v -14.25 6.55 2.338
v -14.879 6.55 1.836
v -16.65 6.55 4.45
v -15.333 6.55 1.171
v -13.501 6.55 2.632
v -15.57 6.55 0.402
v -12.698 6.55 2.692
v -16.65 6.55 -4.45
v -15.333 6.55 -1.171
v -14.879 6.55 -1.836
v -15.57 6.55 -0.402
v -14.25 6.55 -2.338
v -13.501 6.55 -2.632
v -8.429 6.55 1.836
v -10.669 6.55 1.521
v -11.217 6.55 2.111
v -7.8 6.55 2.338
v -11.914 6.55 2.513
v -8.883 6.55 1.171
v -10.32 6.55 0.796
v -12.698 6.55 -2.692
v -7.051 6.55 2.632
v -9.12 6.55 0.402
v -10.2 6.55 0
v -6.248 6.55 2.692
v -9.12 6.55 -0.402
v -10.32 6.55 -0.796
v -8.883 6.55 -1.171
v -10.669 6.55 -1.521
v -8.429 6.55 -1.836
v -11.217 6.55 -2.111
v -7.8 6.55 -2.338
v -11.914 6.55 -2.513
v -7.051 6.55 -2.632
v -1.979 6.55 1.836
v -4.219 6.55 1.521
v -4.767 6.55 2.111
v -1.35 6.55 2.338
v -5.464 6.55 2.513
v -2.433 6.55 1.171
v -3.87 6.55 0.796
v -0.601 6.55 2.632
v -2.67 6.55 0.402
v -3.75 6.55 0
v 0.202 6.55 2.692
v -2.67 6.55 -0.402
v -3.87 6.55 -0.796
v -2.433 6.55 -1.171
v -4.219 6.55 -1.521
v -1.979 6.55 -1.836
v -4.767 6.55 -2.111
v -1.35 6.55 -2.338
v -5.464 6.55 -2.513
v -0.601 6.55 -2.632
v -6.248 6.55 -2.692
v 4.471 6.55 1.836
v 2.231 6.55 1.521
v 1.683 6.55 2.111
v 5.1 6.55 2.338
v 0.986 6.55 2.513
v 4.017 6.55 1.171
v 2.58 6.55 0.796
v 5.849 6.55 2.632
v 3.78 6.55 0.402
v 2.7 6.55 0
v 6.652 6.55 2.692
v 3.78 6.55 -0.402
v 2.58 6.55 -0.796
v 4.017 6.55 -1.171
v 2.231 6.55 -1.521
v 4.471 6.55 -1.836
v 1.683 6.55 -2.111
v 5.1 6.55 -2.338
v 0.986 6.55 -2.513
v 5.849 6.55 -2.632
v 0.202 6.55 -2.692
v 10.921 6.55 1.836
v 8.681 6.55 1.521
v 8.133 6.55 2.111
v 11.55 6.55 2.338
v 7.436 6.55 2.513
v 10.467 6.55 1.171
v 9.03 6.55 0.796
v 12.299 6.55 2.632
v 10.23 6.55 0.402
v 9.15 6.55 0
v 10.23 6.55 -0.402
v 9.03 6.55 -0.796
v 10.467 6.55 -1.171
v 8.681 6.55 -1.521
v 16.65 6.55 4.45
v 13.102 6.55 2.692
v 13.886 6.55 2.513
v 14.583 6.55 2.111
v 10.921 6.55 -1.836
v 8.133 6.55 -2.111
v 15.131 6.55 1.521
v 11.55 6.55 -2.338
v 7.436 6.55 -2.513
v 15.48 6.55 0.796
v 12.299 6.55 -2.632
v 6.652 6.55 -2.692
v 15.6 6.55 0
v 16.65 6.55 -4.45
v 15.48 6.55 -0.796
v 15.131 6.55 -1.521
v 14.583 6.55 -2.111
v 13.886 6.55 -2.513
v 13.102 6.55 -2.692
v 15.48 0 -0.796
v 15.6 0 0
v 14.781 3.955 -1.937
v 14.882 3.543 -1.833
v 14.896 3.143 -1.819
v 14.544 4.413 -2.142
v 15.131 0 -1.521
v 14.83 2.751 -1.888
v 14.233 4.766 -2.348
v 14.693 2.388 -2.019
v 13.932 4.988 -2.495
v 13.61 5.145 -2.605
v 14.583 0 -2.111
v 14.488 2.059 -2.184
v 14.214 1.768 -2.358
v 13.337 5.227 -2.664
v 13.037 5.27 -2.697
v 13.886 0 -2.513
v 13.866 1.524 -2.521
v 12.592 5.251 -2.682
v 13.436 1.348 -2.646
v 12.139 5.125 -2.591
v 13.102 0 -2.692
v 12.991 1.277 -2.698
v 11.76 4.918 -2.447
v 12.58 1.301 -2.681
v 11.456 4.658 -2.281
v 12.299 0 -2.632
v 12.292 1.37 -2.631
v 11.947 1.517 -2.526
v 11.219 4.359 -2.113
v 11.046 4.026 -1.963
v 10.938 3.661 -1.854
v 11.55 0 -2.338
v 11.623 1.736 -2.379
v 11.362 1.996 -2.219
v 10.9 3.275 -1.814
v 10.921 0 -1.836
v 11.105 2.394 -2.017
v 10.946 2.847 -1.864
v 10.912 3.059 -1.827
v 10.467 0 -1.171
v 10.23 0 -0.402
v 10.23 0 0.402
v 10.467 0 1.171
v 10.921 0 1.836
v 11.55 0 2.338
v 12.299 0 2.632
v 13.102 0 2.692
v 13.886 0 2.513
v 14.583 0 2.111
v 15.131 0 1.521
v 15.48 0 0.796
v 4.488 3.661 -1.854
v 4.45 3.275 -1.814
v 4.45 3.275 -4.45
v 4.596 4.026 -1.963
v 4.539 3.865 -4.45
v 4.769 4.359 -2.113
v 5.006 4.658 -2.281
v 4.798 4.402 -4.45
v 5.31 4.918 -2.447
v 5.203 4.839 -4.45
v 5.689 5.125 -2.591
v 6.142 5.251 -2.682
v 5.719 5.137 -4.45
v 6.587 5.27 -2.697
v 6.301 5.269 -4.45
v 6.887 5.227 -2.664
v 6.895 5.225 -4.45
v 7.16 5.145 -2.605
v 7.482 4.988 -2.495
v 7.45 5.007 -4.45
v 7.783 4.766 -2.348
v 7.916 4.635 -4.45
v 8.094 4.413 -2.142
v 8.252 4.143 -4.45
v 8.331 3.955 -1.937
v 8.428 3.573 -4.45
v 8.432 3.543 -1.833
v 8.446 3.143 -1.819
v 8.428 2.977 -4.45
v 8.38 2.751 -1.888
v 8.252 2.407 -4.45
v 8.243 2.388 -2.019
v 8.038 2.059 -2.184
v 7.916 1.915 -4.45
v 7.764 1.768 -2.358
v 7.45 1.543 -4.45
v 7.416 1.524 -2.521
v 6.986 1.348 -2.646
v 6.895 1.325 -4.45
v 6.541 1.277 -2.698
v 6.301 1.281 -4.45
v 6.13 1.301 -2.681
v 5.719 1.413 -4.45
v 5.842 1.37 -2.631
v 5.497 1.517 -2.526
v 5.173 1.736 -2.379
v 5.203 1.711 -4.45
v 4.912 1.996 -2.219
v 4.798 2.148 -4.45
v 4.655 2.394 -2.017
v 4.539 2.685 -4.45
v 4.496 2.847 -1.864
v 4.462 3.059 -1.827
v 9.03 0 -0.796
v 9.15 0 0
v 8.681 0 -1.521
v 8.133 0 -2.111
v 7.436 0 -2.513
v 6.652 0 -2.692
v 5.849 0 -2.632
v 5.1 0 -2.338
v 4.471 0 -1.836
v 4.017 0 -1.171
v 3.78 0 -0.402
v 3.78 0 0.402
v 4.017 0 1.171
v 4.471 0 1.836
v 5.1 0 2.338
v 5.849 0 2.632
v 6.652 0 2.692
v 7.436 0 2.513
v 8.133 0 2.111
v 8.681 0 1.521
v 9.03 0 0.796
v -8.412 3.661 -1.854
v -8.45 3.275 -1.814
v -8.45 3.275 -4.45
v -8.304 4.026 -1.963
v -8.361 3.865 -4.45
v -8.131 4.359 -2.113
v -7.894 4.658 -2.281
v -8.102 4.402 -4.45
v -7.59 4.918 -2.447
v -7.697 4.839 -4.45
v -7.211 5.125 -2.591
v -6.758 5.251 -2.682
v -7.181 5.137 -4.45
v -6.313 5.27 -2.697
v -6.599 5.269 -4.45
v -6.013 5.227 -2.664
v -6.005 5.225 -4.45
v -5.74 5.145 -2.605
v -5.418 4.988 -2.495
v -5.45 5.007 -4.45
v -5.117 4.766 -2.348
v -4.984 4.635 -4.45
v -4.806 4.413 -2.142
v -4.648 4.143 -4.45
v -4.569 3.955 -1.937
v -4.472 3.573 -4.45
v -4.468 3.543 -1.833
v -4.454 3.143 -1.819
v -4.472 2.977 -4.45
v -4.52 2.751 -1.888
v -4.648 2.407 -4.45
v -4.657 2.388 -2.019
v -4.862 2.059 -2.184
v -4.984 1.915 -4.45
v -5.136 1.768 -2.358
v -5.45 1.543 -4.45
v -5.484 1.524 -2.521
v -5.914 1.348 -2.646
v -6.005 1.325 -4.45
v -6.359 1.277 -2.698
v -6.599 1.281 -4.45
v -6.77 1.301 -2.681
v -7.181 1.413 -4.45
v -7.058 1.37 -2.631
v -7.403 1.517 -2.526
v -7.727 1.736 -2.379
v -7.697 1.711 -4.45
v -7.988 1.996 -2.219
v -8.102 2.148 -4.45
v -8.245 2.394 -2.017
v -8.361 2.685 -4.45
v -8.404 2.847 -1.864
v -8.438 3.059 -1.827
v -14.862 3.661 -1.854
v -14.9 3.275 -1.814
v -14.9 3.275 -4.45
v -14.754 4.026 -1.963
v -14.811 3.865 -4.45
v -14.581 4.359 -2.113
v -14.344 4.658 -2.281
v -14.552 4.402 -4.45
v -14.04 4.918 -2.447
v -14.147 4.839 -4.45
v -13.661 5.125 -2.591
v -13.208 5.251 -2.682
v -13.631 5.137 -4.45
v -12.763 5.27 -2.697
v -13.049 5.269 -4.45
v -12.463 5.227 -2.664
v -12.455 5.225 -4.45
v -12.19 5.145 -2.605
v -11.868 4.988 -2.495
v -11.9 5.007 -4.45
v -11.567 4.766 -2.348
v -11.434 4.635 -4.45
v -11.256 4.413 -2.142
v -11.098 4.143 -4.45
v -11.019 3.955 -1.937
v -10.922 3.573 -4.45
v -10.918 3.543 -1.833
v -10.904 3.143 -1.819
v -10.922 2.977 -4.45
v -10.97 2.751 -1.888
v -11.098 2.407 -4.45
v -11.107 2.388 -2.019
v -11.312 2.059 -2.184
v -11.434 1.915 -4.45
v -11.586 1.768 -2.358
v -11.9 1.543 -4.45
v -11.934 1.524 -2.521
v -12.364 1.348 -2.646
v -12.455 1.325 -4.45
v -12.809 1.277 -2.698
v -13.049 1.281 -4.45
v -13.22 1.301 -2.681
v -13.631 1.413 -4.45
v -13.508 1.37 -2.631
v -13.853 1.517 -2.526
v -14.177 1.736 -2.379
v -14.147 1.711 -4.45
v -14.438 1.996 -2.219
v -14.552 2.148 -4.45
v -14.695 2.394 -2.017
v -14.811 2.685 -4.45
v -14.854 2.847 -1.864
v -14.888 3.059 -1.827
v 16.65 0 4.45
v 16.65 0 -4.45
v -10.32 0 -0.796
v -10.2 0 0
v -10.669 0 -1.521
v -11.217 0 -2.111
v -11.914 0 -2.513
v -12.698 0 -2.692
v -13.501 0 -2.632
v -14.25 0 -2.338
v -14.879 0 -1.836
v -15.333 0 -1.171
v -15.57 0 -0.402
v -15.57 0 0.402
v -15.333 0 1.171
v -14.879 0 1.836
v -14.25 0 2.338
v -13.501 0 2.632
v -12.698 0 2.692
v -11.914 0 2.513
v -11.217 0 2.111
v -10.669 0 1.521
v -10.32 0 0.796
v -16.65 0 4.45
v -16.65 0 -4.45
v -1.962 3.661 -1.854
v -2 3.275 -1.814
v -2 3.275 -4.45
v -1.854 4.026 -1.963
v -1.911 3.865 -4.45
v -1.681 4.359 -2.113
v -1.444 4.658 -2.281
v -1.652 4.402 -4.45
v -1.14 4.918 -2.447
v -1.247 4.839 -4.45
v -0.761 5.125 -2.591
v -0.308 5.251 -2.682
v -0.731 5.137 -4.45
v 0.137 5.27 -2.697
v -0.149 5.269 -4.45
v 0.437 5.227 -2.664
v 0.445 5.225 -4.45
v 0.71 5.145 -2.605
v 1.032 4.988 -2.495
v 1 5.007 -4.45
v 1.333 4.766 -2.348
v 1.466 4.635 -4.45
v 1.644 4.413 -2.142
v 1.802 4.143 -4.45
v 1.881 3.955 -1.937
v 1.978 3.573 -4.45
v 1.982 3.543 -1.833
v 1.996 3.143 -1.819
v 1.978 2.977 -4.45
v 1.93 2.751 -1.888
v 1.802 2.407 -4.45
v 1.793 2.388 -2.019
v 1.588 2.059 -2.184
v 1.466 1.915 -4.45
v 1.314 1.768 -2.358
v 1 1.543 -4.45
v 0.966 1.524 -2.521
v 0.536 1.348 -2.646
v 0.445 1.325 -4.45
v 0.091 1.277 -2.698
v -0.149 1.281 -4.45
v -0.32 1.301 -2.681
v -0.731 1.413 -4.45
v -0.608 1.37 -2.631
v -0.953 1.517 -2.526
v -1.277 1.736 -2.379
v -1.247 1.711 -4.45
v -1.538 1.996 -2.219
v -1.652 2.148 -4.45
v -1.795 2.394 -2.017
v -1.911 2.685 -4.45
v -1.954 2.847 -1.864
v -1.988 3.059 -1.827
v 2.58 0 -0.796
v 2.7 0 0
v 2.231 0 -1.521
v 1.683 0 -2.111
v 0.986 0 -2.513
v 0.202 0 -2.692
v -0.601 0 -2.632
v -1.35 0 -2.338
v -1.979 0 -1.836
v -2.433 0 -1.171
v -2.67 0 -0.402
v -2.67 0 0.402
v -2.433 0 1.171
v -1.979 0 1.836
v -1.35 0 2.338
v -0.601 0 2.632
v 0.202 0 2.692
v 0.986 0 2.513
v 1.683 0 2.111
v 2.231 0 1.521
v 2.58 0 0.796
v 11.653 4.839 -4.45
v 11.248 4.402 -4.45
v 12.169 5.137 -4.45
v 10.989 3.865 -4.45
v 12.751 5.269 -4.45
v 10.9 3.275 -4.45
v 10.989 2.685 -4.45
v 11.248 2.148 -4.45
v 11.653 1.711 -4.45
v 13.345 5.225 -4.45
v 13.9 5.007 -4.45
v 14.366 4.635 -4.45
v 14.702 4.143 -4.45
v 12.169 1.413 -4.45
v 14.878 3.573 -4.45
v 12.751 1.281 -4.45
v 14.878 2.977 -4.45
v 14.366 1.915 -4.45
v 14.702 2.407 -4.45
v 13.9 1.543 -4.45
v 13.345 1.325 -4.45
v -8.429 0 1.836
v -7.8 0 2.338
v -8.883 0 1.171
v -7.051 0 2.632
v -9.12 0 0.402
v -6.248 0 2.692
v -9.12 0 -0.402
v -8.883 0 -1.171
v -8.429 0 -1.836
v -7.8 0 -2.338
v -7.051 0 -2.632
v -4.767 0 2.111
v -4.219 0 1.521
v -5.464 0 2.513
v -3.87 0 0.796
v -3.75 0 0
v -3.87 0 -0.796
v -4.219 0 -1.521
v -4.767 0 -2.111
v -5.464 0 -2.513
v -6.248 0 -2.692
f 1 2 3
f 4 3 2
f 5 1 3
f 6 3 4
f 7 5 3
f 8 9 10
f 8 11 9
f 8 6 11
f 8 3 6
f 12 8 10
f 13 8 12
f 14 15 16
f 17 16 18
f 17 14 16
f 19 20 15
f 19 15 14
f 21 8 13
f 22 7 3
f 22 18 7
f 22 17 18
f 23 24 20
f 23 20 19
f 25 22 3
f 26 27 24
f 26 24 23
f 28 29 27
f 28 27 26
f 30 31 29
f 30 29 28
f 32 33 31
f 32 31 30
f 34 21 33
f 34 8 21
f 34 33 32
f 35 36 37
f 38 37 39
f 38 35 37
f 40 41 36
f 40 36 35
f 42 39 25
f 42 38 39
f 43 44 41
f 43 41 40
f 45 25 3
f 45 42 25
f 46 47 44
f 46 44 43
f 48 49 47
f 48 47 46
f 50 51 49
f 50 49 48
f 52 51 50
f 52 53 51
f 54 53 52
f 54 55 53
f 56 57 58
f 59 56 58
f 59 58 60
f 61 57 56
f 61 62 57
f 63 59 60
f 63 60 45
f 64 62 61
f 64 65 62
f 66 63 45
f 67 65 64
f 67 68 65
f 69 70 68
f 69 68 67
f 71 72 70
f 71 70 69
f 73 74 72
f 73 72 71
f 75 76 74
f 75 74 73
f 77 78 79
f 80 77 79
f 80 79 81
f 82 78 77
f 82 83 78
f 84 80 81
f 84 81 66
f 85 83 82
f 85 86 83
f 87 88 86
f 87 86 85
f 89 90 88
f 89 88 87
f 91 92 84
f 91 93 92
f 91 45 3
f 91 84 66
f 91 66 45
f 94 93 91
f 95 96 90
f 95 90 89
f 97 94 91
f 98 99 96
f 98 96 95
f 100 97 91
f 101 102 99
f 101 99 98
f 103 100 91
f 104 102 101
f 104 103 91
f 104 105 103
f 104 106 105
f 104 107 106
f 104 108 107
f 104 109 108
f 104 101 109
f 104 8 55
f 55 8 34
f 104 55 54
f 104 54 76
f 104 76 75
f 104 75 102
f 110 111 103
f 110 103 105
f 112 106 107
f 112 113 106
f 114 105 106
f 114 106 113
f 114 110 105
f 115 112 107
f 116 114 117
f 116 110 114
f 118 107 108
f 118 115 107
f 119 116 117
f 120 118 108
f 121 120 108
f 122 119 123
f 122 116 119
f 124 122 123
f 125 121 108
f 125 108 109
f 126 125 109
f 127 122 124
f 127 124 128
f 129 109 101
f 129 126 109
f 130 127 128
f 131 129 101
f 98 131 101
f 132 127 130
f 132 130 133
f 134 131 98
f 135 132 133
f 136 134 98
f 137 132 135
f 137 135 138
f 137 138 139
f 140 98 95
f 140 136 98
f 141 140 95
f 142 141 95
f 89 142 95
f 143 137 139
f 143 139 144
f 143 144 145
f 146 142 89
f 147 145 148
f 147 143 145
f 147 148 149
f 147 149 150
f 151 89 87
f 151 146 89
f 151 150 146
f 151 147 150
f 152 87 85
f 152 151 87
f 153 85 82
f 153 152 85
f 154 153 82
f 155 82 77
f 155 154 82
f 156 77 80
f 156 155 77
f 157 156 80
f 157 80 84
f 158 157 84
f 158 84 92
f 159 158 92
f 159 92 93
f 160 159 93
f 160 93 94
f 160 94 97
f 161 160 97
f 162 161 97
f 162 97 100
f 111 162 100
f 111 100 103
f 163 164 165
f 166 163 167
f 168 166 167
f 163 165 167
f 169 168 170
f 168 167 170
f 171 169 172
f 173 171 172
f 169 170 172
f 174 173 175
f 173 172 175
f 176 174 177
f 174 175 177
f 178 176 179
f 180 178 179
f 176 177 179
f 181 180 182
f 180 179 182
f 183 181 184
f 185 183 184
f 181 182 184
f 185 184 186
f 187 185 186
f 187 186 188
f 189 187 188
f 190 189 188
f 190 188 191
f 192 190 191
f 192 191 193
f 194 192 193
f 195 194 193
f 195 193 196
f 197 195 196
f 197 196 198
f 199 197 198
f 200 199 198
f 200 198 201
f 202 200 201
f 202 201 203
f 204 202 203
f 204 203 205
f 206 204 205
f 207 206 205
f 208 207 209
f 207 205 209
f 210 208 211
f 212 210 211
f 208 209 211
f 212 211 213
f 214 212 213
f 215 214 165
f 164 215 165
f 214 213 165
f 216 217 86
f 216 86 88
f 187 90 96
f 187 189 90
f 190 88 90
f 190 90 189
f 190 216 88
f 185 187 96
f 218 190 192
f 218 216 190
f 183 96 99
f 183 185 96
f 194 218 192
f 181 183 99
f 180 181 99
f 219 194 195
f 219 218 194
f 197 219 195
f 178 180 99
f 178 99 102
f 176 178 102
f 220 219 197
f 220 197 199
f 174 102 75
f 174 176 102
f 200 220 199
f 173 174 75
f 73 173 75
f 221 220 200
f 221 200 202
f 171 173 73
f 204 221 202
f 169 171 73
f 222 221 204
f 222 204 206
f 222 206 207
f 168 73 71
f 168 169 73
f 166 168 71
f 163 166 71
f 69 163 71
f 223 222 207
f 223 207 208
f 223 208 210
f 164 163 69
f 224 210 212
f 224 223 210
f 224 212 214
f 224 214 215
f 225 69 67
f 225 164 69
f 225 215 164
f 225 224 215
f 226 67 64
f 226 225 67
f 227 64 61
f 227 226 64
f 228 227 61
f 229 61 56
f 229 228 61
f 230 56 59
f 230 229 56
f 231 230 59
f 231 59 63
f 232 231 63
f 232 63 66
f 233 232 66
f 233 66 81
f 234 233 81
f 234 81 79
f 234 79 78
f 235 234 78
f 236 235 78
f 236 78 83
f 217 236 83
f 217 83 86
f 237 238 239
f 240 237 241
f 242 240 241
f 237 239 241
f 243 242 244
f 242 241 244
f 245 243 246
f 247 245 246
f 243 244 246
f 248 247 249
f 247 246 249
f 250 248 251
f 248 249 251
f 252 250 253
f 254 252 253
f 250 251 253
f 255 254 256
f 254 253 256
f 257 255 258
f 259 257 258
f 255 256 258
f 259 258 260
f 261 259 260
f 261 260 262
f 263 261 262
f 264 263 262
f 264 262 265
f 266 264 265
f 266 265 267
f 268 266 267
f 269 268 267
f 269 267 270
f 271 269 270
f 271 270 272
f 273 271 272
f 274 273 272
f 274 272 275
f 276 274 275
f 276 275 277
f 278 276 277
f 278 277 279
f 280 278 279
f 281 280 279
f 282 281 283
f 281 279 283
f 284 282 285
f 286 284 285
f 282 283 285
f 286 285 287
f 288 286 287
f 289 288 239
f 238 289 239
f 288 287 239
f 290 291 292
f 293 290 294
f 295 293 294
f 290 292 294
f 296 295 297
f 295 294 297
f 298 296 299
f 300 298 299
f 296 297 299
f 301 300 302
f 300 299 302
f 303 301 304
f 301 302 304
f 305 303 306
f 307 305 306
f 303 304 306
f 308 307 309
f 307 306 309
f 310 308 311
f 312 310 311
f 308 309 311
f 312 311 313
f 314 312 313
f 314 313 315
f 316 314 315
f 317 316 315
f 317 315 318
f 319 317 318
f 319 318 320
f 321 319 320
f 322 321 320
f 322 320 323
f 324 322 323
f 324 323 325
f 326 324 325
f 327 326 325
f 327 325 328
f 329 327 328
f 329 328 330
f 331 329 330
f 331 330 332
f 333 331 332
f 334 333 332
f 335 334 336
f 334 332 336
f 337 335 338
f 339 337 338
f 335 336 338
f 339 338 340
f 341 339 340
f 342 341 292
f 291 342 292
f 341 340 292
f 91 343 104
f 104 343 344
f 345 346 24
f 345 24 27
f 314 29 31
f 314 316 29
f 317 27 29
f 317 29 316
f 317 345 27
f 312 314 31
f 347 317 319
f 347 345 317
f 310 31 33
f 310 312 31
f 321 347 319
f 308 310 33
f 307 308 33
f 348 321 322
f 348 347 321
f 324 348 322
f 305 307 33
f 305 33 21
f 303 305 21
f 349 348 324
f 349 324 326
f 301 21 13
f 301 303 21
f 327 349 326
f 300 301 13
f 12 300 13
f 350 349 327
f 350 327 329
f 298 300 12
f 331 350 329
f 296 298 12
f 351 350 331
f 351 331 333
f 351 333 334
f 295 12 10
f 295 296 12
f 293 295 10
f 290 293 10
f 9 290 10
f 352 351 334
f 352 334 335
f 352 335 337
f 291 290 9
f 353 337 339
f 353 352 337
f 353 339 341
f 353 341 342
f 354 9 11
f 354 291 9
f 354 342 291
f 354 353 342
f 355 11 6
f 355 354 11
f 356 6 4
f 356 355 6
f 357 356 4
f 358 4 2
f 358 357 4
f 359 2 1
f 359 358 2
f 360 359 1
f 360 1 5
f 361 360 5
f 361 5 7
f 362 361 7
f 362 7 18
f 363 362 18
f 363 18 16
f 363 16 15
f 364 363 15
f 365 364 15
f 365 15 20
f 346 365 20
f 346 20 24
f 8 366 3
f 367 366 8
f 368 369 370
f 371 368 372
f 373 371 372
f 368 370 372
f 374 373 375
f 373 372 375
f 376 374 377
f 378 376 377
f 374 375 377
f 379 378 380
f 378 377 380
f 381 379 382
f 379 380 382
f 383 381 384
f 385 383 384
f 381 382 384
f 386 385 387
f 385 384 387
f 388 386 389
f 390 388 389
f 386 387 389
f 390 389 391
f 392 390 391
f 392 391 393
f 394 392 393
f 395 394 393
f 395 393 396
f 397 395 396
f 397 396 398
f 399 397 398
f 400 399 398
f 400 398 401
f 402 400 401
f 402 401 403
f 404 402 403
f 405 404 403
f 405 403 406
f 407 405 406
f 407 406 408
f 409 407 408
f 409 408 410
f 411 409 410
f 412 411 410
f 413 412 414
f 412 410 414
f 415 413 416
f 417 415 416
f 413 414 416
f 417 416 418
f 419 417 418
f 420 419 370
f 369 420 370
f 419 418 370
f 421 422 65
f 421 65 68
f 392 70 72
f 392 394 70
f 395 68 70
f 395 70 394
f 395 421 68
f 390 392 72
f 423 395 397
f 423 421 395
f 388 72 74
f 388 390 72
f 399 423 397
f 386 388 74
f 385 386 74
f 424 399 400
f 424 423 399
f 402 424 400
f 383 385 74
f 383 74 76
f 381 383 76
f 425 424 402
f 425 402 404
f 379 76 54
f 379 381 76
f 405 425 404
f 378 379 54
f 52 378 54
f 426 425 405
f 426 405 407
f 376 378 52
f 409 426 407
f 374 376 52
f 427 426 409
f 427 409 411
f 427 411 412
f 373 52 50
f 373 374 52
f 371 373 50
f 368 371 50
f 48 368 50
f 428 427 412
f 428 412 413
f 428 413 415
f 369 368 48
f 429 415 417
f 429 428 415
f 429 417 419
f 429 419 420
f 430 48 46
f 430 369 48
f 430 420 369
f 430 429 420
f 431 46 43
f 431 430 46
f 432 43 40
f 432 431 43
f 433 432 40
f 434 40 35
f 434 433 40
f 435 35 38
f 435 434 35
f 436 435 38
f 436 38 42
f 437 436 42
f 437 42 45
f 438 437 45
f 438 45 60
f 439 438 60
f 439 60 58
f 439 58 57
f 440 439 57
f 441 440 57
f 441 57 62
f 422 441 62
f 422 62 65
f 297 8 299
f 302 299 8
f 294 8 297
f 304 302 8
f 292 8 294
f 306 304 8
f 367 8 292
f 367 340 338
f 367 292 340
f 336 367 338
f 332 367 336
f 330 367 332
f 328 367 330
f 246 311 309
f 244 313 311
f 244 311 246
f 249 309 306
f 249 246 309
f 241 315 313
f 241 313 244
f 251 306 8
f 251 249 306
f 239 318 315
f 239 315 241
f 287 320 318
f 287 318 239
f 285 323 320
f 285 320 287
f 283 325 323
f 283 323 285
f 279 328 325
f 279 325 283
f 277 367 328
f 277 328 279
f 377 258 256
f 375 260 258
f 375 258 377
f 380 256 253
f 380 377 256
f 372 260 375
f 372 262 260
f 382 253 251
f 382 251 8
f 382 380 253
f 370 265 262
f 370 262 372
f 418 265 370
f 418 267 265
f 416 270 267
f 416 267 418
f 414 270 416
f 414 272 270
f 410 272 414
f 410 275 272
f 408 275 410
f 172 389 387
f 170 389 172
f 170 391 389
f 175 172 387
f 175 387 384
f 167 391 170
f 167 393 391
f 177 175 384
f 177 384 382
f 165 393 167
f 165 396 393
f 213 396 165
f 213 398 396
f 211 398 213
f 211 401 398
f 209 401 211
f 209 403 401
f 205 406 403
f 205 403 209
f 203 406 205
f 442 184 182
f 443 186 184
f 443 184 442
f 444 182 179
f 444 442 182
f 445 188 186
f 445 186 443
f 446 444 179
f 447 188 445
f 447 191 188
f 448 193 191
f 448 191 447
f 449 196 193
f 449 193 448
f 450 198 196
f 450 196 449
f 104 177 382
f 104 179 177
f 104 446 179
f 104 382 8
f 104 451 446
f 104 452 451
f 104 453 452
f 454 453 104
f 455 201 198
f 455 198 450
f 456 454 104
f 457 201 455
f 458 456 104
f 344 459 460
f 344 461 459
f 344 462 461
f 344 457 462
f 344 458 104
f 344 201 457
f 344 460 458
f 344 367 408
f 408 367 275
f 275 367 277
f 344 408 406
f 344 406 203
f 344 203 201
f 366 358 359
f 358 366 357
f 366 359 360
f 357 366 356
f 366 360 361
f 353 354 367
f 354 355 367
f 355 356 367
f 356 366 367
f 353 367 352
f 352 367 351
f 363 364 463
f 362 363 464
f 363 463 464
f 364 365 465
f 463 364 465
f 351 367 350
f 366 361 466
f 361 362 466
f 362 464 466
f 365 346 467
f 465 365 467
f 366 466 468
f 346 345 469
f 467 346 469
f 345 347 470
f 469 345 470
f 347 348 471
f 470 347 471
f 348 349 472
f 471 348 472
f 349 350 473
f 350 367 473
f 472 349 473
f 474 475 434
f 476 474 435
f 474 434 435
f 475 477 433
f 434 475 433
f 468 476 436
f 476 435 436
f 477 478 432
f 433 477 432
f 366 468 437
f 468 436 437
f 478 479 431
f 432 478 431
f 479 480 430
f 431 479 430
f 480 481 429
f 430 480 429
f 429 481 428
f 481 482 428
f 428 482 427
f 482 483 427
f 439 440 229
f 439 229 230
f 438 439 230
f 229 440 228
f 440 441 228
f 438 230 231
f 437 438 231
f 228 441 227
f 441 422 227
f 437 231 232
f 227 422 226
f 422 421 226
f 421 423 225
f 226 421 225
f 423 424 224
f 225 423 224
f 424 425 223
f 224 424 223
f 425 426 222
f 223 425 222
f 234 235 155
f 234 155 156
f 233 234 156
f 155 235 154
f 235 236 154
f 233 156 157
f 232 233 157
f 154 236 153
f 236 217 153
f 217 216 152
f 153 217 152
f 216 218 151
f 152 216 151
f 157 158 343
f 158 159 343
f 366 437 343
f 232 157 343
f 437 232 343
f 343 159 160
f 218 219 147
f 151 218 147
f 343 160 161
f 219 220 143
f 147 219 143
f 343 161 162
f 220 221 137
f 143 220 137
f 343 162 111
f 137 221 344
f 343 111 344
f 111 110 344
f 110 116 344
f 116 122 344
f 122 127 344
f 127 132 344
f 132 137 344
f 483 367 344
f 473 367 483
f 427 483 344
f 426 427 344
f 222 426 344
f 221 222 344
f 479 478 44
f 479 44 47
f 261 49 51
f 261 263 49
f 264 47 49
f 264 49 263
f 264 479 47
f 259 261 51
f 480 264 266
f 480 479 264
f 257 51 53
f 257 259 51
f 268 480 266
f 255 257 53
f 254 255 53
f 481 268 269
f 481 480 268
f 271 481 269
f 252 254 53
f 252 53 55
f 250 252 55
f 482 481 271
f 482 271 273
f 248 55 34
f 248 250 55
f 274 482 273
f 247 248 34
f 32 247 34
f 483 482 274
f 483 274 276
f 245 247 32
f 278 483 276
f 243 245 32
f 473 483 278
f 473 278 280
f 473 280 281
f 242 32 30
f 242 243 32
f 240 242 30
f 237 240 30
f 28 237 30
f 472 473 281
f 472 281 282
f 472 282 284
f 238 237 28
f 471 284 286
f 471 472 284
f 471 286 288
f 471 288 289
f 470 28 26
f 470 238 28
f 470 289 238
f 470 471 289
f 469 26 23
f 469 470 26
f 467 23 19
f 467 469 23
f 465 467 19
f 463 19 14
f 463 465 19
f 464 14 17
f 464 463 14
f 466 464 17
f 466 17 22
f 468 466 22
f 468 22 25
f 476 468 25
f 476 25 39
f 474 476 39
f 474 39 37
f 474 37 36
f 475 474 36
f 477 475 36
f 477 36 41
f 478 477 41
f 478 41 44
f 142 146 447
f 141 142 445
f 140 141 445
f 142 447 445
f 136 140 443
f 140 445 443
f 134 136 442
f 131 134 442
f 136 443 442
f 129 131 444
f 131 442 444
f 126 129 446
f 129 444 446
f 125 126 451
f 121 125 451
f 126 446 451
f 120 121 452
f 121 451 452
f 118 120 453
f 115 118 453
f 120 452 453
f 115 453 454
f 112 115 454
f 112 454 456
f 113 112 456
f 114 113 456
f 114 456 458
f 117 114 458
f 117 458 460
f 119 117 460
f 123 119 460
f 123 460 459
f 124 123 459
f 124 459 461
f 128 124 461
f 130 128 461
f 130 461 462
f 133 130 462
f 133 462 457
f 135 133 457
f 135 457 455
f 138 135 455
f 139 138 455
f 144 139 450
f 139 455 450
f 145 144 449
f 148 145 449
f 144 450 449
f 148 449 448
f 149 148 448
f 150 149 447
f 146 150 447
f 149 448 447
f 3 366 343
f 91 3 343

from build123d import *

# Parameters (mm, degrees)
SKETCH1_W           = 33.3
SKETCH1_H           = 8.9
SKETCH1_R           = 2.7
BOSS_EXTRUDE1_DEPTH = 6.55
CUT_EXTRUDE1_REACH  = 10.9
SKETCH2_R           = 2


with BuildPart() as part:
    # Sketch1 → Boss-Extrude1 (new body)
    with BuildSketch(Plane(origin=(0, 0, 0), x_dir=(1, 0, 0), z_dir=(0, 1, 0))):
        Rectangle(SKETCH1_W, SKETCH1_H)
        with Locations((-12.9, 0)):
            Circle(SKETCH1_R, mode=Mode.SUBTRACT)
        with Locations((-6.45, 0)):
            Circle(SKETCH1_R, mode=Mode.SUBTRACT)
        Circle(SKETCH1_R, mode=Mode.SUBTRACT)
        with Locations((6.45, 0)):
            Circle(SKETCH1_R, mode=Mode.SUBTRACT)
        with Locations((12.9, 0)):
            Circle(SKETCH1_R, mode=Mode.SUBTRACT)
    extrude(amount=BOSS_EXTRUDE1_DEPTH)

    # Sketch2 → Cut-Extrude1 (cut, up to next)
    with BuildSketch(Plane(origin=(0, 0, -4.45), x_dir=(-1, 0, 0), z_dir=(0, 0, -1)), mode=Mode.PRIVATE) as cut_extrude1_sk1:
        with Locations((-12.9, 3.275)):
            Circle(SKETCH2_R)
    cut_extrude1_tool1 = extrude(cut_extrude1_sk1.sketch, amount=-CUT_EXTRUDE1_REACH, mode=Mode.PRIVATE) & part.part
    add(cut_extrude1_tool1.solids().sort_by_distance((12.9, 3.275, -4.45))[0], mode=Mode.SUBTRACT)
    # Sketch2 → Cut-Extrude1 (cut, up to next)
    with BuildSketch(Plane(origin=(0, 0, -4.45), x_dir=(-1, 0, 0), z_dir=(0, 0, -1)), mode=Mode.PRIVATE) as cut_extrude1_sk2:
        with Locations((-6.45, 3.275)):
            Circle(SKETCH2_R)
    cut_extrude1_tool2 = extrude(cut_extrude1_sk2.sketch, amount=-CUT_EXTRUDE1_REACH, mode=Mode.PRIVATE) & part.part
    add(cut_extrude1_tool2.solids().sort_by_distance((6.45, 3.275, -4.45))[0], mode=Mode.SUBTRACT)
    # Sketch2 → Cut-Extrude1 (cut, up to next)
    with BuildSketch(Plane(origin=(0, 0, -4.45), x_dir=(-1, 0, 0), z_dir=(0, 0, -1)), mode=Mode.PRIVATE) as cut_extrude1_sk3:
        with Locations((0, 3.275)):
            Circle(SKETCH2_R)
    cut_extrude1_tool3 = extrude(cut_extrude1_sk3.sketch, amount=-CUT_EXTRUDE1_REACH, mode=Mode.PRIVATE) & part.part
    add(cut_extrude1_tool3.solids().sort_by_distance((0, 3.275, -4.45))[0], mode=Mode.SUBTRACT)
    # Sketch2 → Cut-Extrude1 (cut, up to next)
    with BuildSketch(Plane(origin=(0, 0, -4.45), x_dir=(-1, 0, 0), z_dir=(0, 0, -1)), mode=Mode.PRIVATE) as cut_extrude1_sk4:
        with Locations((6.45, 3.275)):
            Circle(SKETCH2_R)
    cut_extrude1_tool4 = extrude(cut_extrude1_sk4.sketch, amount=-CUT_EXTRUDE1_REACH, mode=Mode.PRIVATE) & part.part
    add(cut_extrude1_tool4.solids().sort_by_distance((-6.45, 3.275, -4.45))[0], mode=Mode.SUBTRACT)
    # Sketch2 → Cut-Extrude1 (cut, up to next)
    with BuildSketch(Plane(origin=(0, 0, -4.45), x_dir=(-1, 0, 0), z_dir=(0, 0, -1)), mode=Mode.PRIVATE) as cut_extrude1_sk5:
        with Locations((12.9, 3.275)):
            Circle(SKETCH2_R)
    cut_extrude1_tool5 = extrude(cut_extrude1_sk5.sketch, amount=-CUT_EXTRUDE1_REACH, mode=Mode.PRIVATE) & part.part
    add(cut_extrude1_tool5.solids().sort_by_distance((-12.9, 3.275, -4.45))[0], mode=Mode.SUBTRACT)


solid = part.part
